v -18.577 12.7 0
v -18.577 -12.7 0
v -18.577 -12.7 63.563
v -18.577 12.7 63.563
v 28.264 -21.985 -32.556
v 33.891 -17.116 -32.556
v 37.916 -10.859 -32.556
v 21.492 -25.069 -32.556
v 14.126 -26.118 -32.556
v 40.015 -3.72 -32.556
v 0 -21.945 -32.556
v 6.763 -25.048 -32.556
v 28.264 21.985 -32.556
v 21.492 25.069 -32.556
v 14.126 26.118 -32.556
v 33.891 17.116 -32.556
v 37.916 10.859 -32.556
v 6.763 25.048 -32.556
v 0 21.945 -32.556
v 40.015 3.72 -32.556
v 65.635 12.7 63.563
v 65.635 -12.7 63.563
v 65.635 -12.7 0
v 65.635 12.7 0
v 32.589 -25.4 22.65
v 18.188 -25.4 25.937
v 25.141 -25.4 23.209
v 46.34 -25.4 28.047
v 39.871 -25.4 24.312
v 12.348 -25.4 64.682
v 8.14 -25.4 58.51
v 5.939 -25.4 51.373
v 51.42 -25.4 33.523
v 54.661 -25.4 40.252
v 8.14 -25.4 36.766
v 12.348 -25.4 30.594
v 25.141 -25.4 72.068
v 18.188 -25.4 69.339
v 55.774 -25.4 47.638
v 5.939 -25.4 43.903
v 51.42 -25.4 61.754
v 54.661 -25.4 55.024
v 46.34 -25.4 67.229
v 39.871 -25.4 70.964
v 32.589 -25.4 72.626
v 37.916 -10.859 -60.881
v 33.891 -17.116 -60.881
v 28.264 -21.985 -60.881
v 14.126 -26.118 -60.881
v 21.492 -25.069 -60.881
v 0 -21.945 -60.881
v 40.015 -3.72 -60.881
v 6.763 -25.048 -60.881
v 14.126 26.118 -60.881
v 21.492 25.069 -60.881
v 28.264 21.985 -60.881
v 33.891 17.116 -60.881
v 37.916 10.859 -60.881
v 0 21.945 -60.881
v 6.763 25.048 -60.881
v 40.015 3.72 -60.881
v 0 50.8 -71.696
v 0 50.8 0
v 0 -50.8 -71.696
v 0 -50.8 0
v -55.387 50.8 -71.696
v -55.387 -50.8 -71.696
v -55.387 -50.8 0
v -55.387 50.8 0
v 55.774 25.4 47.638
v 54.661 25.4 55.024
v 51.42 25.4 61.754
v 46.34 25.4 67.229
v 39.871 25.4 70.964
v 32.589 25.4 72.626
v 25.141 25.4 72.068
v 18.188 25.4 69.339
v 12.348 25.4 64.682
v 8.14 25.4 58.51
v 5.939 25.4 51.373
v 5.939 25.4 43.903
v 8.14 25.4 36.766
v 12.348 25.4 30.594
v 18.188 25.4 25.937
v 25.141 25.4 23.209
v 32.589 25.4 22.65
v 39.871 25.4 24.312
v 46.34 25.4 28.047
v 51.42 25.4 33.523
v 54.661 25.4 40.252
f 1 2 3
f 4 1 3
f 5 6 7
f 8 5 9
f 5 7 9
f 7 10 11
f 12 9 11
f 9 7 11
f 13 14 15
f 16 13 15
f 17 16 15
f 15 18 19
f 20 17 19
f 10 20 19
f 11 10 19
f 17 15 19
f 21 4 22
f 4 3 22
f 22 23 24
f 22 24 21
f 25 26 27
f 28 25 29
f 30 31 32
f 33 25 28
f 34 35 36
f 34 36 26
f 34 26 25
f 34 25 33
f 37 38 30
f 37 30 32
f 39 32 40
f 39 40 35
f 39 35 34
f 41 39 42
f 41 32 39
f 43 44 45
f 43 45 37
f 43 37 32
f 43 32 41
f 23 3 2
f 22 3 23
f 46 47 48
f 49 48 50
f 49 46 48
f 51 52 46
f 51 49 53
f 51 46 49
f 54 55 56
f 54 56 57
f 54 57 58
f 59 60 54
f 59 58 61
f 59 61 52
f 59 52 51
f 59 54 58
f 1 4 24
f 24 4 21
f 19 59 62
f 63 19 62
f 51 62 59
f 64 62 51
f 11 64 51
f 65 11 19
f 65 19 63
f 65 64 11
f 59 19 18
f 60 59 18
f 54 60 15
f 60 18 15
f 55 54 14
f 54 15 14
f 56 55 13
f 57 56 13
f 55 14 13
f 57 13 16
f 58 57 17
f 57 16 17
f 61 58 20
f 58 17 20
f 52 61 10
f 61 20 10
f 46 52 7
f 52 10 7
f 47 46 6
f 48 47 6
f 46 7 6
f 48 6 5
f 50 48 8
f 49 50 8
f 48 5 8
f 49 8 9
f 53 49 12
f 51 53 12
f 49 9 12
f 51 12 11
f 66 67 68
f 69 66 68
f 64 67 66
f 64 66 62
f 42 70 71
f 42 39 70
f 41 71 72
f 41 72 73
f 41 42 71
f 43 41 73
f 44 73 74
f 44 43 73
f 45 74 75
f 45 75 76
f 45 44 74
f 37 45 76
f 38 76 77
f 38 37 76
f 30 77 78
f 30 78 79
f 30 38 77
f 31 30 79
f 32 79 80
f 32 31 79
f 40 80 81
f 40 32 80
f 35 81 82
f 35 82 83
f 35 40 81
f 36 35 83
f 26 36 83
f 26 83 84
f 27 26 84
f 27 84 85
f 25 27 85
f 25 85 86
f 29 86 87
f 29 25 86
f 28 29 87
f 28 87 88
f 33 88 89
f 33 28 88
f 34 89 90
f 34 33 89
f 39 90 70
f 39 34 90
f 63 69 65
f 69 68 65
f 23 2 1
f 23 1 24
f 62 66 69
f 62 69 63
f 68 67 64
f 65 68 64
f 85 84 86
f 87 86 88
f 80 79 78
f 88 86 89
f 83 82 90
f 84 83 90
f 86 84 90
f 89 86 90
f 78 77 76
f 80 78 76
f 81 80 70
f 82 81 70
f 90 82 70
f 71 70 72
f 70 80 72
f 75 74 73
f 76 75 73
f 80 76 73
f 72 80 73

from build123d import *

# Parameters (mm, degrees)
F0_W     = 55.387489
F0_H     = 71.696088
F1_DEPTH = 50.8
F2_R     = 25.057859
F3_DEPTH = 25.4
F4_W     = 84.212516
F4_H     = 63.563347
F5_DEPTH = 12.7
F6_W     = 26.118208
F6_H     = 28.325379


with BuildPart() as f1:
    # F0 (on Front) → F1 (new body, symmetric)
    with BuildSketch(Plane.XZ):
        with Locations((-27.693744, -35.848044)):
            Rectangle(F0_W, F0_H)
    extrude(amount=F1_DEPTH, both=True)

    # F6 (on Front) → F7 (revolve)
    with BuildSketch(Plane.XZ):
        with Locations((1.103587, -46.718481)):
            Rectangle(F6_W, F6_H)
    revolve(axis=Axis((14.162691, 0, -46.718482), (0, 0, -1)))


with BuildPart() as f3:
    # F2 (on Front) → F3 (new body, symmetric)
    with BuildSketch(Plane.XZ):
        with Locations((30.716484, 47.638137)):
            Circle(F2_R)
    extrude(amount=F3_DEPTH, both=True)


with BuildPart() as f5:
    # F4 (on Front) → F5 (new body, symmetric)
    with BuildSketch(Plane.XZ):
        with Locations((23.529222, 31.781674)):
            Rectangle(F4_W, F4_H)
    extrude(amount=F5_DEPTH, both=True)


solid = Compound([f1.part, f3.part, f5.part])
